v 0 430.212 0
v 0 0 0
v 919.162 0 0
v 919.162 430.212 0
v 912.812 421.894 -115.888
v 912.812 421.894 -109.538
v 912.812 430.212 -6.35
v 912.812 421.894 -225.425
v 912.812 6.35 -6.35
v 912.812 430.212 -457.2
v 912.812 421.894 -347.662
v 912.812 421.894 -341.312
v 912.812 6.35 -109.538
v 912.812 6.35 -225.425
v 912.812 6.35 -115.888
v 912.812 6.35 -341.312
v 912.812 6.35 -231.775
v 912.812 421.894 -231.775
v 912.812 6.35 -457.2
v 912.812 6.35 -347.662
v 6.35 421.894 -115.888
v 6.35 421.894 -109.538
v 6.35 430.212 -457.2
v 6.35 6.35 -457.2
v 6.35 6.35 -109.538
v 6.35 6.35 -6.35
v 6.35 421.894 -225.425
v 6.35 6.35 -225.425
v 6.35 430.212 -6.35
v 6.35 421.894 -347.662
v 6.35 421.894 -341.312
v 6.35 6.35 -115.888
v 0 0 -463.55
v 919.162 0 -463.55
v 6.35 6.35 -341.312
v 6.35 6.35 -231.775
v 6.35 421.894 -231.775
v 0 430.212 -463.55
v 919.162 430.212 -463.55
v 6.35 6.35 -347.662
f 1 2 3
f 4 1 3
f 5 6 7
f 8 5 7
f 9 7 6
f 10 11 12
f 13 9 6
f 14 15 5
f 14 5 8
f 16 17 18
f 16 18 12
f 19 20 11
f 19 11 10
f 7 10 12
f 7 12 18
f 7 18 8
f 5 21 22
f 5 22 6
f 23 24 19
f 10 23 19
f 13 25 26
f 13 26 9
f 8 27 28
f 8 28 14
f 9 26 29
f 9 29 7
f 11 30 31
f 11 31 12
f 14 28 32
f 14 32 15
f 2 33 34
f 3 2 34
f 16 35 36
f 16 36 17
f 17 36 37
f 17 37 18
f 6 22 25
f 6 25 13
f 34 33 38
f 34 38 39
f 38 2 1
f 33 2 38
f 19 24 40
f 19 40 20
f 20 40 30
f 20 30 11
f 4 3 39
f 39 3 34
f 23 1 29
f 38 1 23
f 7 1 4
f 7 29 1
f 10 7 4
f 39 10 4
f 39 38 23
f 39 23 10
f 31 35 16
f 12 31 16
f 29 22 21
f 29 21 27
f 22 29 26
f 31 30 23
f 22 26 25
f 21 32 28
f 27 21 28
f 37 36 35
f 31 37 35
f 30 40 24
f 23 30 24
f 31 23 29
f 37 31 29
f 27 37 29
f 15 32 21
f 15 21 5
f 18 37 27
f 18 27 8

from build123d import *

# Parameters (mm, degrees)
SKETCH1_W                       = 919.1625
SKETCH1_H                       = 463.55
BOSS_EXTRUDE1_DEPTH             = 430.2125
SHELL1_T                        = -6.35
BOSS_EXTRUDE2_REACH             = 393.414
SKETCH2_W                       = 906.4625
SKETCH2_H                       = 6.35
BOSS_EXTRUDE2_DIRECTION_2_DEPTH = 30.48


with BuildPart() as part:
    # Sketch1 → Boss-Extrude1 (new body)
    with BuildSketch(Plane(origin=(0, 0, 0), x_dir=(1, 0, 0), z_dir=(0, 1, 0))):
        with Locations((459.58125, 231.775)):
            Rectangle(SKETCH1_W, SKETCH1_H)
    extrude(amount=BOSS_EXTRUDE1_DEPTH)

    # Shell1
    shell1_openings = [part.faces().sort_by_distance(p)[0] for p in [
        (459.58125, 430.2125, -231.775),
    ]]
    offset(amount=SHELL1_T, openings=shell1_openings, kind=Kind.INTERSECTION)

    # Sketch2 → Boss-Extrude2 (add, up to next)
    with BuildSketch(Plane(origin=(0, 391.414, 0), x_dir=(1, 0, 0), z_dir=(0, 1, 0)), mode=Mode.PRIVATE) as boss_extrude2_sk1:
        with Locations((459.58125, 344.4875)):
            Rectangle(SKETCH2_W, SKETCH2_H)
    boss_extrude2_tool1 = extrude(boss_extrude2_sk1.sketch, amount=-BOSS_EXTRUDE2_REACH, mode=Mode.PRIVATE) - part.part
    add(boss_extrude2_tool1.solids().sort_by_distance((459.58125, 391.414, -344.4875))[0])
    # Sketch2 → Boss-Extrude2 (add, up to next)
    with BuildSketch(Plane(origin=(0, 391.414, 0), x_dir=(1, 0, 0), z_dir=(0, 1, 0)), mode=Mode.PRIVATE) as boss_extrude2_sk2:
        with Locations((459.58125, 228.6)):
            Rectangle(SKETCH2_W, SKETCH2_H)
    boss_extrude2_tool2 = extrude(boss_extrude2_sk2.sketch, amount=-BOSS_EXTRUDE2_REACH, mode=Mode.PRIVATE) - part.part
    add(boss_extrude2_tool2.solids().sort_by_distance((459.58125, 391.414, -228.6))[0])
    # Sketch2 → Boss-Extrude2 (add, up to next)
    with BuildSketch(Plane(origin=(0, 391.414, 0), x_dir=(1, 0, 0), z_dir=(0, 1, 0)), mode=Mode.PRIVATE) as boss_extrude2_sk3:
        with Locations((459.58125, 112.7125)):
            Rectangle(SKETCH2_W, SKETCH2_H)
    boss_extrude2_tool3 = extrude(boss_extrude2_sk3.sketch, amount=-BOSS_EXTRUDE2_REACH, mode=Mode.PRIVATE) - part.part
    add(boss_extrude2_tool3.solids().sort_by_distance((459.58125, 391.414, -112.7125))[0])

    # Sketch2 → Boss-Extrude2 direction 2 (add)
    with BuildSketch(Plane(origin=(0, 391.414, 0), x_dir=(1, 0, 0), z_dir=(0, 1, 0))):
        with Locations((459.58125, 344.4875)):
            Rectangle(SKETCH2_W, SKETCH2_H)
        with Locations((459.58125, 228.6)):
            Rectangle(SKETCH2_W, SKETCH2_H)
        with Locations((459.58125, 112.7125)):
            Rectangle(SKETCH2_W, SKETCH2_H)
    extrude(amount=BOSS_EXTRUDE2_DIRECTION_2_DEPTH)


solid = part.part
